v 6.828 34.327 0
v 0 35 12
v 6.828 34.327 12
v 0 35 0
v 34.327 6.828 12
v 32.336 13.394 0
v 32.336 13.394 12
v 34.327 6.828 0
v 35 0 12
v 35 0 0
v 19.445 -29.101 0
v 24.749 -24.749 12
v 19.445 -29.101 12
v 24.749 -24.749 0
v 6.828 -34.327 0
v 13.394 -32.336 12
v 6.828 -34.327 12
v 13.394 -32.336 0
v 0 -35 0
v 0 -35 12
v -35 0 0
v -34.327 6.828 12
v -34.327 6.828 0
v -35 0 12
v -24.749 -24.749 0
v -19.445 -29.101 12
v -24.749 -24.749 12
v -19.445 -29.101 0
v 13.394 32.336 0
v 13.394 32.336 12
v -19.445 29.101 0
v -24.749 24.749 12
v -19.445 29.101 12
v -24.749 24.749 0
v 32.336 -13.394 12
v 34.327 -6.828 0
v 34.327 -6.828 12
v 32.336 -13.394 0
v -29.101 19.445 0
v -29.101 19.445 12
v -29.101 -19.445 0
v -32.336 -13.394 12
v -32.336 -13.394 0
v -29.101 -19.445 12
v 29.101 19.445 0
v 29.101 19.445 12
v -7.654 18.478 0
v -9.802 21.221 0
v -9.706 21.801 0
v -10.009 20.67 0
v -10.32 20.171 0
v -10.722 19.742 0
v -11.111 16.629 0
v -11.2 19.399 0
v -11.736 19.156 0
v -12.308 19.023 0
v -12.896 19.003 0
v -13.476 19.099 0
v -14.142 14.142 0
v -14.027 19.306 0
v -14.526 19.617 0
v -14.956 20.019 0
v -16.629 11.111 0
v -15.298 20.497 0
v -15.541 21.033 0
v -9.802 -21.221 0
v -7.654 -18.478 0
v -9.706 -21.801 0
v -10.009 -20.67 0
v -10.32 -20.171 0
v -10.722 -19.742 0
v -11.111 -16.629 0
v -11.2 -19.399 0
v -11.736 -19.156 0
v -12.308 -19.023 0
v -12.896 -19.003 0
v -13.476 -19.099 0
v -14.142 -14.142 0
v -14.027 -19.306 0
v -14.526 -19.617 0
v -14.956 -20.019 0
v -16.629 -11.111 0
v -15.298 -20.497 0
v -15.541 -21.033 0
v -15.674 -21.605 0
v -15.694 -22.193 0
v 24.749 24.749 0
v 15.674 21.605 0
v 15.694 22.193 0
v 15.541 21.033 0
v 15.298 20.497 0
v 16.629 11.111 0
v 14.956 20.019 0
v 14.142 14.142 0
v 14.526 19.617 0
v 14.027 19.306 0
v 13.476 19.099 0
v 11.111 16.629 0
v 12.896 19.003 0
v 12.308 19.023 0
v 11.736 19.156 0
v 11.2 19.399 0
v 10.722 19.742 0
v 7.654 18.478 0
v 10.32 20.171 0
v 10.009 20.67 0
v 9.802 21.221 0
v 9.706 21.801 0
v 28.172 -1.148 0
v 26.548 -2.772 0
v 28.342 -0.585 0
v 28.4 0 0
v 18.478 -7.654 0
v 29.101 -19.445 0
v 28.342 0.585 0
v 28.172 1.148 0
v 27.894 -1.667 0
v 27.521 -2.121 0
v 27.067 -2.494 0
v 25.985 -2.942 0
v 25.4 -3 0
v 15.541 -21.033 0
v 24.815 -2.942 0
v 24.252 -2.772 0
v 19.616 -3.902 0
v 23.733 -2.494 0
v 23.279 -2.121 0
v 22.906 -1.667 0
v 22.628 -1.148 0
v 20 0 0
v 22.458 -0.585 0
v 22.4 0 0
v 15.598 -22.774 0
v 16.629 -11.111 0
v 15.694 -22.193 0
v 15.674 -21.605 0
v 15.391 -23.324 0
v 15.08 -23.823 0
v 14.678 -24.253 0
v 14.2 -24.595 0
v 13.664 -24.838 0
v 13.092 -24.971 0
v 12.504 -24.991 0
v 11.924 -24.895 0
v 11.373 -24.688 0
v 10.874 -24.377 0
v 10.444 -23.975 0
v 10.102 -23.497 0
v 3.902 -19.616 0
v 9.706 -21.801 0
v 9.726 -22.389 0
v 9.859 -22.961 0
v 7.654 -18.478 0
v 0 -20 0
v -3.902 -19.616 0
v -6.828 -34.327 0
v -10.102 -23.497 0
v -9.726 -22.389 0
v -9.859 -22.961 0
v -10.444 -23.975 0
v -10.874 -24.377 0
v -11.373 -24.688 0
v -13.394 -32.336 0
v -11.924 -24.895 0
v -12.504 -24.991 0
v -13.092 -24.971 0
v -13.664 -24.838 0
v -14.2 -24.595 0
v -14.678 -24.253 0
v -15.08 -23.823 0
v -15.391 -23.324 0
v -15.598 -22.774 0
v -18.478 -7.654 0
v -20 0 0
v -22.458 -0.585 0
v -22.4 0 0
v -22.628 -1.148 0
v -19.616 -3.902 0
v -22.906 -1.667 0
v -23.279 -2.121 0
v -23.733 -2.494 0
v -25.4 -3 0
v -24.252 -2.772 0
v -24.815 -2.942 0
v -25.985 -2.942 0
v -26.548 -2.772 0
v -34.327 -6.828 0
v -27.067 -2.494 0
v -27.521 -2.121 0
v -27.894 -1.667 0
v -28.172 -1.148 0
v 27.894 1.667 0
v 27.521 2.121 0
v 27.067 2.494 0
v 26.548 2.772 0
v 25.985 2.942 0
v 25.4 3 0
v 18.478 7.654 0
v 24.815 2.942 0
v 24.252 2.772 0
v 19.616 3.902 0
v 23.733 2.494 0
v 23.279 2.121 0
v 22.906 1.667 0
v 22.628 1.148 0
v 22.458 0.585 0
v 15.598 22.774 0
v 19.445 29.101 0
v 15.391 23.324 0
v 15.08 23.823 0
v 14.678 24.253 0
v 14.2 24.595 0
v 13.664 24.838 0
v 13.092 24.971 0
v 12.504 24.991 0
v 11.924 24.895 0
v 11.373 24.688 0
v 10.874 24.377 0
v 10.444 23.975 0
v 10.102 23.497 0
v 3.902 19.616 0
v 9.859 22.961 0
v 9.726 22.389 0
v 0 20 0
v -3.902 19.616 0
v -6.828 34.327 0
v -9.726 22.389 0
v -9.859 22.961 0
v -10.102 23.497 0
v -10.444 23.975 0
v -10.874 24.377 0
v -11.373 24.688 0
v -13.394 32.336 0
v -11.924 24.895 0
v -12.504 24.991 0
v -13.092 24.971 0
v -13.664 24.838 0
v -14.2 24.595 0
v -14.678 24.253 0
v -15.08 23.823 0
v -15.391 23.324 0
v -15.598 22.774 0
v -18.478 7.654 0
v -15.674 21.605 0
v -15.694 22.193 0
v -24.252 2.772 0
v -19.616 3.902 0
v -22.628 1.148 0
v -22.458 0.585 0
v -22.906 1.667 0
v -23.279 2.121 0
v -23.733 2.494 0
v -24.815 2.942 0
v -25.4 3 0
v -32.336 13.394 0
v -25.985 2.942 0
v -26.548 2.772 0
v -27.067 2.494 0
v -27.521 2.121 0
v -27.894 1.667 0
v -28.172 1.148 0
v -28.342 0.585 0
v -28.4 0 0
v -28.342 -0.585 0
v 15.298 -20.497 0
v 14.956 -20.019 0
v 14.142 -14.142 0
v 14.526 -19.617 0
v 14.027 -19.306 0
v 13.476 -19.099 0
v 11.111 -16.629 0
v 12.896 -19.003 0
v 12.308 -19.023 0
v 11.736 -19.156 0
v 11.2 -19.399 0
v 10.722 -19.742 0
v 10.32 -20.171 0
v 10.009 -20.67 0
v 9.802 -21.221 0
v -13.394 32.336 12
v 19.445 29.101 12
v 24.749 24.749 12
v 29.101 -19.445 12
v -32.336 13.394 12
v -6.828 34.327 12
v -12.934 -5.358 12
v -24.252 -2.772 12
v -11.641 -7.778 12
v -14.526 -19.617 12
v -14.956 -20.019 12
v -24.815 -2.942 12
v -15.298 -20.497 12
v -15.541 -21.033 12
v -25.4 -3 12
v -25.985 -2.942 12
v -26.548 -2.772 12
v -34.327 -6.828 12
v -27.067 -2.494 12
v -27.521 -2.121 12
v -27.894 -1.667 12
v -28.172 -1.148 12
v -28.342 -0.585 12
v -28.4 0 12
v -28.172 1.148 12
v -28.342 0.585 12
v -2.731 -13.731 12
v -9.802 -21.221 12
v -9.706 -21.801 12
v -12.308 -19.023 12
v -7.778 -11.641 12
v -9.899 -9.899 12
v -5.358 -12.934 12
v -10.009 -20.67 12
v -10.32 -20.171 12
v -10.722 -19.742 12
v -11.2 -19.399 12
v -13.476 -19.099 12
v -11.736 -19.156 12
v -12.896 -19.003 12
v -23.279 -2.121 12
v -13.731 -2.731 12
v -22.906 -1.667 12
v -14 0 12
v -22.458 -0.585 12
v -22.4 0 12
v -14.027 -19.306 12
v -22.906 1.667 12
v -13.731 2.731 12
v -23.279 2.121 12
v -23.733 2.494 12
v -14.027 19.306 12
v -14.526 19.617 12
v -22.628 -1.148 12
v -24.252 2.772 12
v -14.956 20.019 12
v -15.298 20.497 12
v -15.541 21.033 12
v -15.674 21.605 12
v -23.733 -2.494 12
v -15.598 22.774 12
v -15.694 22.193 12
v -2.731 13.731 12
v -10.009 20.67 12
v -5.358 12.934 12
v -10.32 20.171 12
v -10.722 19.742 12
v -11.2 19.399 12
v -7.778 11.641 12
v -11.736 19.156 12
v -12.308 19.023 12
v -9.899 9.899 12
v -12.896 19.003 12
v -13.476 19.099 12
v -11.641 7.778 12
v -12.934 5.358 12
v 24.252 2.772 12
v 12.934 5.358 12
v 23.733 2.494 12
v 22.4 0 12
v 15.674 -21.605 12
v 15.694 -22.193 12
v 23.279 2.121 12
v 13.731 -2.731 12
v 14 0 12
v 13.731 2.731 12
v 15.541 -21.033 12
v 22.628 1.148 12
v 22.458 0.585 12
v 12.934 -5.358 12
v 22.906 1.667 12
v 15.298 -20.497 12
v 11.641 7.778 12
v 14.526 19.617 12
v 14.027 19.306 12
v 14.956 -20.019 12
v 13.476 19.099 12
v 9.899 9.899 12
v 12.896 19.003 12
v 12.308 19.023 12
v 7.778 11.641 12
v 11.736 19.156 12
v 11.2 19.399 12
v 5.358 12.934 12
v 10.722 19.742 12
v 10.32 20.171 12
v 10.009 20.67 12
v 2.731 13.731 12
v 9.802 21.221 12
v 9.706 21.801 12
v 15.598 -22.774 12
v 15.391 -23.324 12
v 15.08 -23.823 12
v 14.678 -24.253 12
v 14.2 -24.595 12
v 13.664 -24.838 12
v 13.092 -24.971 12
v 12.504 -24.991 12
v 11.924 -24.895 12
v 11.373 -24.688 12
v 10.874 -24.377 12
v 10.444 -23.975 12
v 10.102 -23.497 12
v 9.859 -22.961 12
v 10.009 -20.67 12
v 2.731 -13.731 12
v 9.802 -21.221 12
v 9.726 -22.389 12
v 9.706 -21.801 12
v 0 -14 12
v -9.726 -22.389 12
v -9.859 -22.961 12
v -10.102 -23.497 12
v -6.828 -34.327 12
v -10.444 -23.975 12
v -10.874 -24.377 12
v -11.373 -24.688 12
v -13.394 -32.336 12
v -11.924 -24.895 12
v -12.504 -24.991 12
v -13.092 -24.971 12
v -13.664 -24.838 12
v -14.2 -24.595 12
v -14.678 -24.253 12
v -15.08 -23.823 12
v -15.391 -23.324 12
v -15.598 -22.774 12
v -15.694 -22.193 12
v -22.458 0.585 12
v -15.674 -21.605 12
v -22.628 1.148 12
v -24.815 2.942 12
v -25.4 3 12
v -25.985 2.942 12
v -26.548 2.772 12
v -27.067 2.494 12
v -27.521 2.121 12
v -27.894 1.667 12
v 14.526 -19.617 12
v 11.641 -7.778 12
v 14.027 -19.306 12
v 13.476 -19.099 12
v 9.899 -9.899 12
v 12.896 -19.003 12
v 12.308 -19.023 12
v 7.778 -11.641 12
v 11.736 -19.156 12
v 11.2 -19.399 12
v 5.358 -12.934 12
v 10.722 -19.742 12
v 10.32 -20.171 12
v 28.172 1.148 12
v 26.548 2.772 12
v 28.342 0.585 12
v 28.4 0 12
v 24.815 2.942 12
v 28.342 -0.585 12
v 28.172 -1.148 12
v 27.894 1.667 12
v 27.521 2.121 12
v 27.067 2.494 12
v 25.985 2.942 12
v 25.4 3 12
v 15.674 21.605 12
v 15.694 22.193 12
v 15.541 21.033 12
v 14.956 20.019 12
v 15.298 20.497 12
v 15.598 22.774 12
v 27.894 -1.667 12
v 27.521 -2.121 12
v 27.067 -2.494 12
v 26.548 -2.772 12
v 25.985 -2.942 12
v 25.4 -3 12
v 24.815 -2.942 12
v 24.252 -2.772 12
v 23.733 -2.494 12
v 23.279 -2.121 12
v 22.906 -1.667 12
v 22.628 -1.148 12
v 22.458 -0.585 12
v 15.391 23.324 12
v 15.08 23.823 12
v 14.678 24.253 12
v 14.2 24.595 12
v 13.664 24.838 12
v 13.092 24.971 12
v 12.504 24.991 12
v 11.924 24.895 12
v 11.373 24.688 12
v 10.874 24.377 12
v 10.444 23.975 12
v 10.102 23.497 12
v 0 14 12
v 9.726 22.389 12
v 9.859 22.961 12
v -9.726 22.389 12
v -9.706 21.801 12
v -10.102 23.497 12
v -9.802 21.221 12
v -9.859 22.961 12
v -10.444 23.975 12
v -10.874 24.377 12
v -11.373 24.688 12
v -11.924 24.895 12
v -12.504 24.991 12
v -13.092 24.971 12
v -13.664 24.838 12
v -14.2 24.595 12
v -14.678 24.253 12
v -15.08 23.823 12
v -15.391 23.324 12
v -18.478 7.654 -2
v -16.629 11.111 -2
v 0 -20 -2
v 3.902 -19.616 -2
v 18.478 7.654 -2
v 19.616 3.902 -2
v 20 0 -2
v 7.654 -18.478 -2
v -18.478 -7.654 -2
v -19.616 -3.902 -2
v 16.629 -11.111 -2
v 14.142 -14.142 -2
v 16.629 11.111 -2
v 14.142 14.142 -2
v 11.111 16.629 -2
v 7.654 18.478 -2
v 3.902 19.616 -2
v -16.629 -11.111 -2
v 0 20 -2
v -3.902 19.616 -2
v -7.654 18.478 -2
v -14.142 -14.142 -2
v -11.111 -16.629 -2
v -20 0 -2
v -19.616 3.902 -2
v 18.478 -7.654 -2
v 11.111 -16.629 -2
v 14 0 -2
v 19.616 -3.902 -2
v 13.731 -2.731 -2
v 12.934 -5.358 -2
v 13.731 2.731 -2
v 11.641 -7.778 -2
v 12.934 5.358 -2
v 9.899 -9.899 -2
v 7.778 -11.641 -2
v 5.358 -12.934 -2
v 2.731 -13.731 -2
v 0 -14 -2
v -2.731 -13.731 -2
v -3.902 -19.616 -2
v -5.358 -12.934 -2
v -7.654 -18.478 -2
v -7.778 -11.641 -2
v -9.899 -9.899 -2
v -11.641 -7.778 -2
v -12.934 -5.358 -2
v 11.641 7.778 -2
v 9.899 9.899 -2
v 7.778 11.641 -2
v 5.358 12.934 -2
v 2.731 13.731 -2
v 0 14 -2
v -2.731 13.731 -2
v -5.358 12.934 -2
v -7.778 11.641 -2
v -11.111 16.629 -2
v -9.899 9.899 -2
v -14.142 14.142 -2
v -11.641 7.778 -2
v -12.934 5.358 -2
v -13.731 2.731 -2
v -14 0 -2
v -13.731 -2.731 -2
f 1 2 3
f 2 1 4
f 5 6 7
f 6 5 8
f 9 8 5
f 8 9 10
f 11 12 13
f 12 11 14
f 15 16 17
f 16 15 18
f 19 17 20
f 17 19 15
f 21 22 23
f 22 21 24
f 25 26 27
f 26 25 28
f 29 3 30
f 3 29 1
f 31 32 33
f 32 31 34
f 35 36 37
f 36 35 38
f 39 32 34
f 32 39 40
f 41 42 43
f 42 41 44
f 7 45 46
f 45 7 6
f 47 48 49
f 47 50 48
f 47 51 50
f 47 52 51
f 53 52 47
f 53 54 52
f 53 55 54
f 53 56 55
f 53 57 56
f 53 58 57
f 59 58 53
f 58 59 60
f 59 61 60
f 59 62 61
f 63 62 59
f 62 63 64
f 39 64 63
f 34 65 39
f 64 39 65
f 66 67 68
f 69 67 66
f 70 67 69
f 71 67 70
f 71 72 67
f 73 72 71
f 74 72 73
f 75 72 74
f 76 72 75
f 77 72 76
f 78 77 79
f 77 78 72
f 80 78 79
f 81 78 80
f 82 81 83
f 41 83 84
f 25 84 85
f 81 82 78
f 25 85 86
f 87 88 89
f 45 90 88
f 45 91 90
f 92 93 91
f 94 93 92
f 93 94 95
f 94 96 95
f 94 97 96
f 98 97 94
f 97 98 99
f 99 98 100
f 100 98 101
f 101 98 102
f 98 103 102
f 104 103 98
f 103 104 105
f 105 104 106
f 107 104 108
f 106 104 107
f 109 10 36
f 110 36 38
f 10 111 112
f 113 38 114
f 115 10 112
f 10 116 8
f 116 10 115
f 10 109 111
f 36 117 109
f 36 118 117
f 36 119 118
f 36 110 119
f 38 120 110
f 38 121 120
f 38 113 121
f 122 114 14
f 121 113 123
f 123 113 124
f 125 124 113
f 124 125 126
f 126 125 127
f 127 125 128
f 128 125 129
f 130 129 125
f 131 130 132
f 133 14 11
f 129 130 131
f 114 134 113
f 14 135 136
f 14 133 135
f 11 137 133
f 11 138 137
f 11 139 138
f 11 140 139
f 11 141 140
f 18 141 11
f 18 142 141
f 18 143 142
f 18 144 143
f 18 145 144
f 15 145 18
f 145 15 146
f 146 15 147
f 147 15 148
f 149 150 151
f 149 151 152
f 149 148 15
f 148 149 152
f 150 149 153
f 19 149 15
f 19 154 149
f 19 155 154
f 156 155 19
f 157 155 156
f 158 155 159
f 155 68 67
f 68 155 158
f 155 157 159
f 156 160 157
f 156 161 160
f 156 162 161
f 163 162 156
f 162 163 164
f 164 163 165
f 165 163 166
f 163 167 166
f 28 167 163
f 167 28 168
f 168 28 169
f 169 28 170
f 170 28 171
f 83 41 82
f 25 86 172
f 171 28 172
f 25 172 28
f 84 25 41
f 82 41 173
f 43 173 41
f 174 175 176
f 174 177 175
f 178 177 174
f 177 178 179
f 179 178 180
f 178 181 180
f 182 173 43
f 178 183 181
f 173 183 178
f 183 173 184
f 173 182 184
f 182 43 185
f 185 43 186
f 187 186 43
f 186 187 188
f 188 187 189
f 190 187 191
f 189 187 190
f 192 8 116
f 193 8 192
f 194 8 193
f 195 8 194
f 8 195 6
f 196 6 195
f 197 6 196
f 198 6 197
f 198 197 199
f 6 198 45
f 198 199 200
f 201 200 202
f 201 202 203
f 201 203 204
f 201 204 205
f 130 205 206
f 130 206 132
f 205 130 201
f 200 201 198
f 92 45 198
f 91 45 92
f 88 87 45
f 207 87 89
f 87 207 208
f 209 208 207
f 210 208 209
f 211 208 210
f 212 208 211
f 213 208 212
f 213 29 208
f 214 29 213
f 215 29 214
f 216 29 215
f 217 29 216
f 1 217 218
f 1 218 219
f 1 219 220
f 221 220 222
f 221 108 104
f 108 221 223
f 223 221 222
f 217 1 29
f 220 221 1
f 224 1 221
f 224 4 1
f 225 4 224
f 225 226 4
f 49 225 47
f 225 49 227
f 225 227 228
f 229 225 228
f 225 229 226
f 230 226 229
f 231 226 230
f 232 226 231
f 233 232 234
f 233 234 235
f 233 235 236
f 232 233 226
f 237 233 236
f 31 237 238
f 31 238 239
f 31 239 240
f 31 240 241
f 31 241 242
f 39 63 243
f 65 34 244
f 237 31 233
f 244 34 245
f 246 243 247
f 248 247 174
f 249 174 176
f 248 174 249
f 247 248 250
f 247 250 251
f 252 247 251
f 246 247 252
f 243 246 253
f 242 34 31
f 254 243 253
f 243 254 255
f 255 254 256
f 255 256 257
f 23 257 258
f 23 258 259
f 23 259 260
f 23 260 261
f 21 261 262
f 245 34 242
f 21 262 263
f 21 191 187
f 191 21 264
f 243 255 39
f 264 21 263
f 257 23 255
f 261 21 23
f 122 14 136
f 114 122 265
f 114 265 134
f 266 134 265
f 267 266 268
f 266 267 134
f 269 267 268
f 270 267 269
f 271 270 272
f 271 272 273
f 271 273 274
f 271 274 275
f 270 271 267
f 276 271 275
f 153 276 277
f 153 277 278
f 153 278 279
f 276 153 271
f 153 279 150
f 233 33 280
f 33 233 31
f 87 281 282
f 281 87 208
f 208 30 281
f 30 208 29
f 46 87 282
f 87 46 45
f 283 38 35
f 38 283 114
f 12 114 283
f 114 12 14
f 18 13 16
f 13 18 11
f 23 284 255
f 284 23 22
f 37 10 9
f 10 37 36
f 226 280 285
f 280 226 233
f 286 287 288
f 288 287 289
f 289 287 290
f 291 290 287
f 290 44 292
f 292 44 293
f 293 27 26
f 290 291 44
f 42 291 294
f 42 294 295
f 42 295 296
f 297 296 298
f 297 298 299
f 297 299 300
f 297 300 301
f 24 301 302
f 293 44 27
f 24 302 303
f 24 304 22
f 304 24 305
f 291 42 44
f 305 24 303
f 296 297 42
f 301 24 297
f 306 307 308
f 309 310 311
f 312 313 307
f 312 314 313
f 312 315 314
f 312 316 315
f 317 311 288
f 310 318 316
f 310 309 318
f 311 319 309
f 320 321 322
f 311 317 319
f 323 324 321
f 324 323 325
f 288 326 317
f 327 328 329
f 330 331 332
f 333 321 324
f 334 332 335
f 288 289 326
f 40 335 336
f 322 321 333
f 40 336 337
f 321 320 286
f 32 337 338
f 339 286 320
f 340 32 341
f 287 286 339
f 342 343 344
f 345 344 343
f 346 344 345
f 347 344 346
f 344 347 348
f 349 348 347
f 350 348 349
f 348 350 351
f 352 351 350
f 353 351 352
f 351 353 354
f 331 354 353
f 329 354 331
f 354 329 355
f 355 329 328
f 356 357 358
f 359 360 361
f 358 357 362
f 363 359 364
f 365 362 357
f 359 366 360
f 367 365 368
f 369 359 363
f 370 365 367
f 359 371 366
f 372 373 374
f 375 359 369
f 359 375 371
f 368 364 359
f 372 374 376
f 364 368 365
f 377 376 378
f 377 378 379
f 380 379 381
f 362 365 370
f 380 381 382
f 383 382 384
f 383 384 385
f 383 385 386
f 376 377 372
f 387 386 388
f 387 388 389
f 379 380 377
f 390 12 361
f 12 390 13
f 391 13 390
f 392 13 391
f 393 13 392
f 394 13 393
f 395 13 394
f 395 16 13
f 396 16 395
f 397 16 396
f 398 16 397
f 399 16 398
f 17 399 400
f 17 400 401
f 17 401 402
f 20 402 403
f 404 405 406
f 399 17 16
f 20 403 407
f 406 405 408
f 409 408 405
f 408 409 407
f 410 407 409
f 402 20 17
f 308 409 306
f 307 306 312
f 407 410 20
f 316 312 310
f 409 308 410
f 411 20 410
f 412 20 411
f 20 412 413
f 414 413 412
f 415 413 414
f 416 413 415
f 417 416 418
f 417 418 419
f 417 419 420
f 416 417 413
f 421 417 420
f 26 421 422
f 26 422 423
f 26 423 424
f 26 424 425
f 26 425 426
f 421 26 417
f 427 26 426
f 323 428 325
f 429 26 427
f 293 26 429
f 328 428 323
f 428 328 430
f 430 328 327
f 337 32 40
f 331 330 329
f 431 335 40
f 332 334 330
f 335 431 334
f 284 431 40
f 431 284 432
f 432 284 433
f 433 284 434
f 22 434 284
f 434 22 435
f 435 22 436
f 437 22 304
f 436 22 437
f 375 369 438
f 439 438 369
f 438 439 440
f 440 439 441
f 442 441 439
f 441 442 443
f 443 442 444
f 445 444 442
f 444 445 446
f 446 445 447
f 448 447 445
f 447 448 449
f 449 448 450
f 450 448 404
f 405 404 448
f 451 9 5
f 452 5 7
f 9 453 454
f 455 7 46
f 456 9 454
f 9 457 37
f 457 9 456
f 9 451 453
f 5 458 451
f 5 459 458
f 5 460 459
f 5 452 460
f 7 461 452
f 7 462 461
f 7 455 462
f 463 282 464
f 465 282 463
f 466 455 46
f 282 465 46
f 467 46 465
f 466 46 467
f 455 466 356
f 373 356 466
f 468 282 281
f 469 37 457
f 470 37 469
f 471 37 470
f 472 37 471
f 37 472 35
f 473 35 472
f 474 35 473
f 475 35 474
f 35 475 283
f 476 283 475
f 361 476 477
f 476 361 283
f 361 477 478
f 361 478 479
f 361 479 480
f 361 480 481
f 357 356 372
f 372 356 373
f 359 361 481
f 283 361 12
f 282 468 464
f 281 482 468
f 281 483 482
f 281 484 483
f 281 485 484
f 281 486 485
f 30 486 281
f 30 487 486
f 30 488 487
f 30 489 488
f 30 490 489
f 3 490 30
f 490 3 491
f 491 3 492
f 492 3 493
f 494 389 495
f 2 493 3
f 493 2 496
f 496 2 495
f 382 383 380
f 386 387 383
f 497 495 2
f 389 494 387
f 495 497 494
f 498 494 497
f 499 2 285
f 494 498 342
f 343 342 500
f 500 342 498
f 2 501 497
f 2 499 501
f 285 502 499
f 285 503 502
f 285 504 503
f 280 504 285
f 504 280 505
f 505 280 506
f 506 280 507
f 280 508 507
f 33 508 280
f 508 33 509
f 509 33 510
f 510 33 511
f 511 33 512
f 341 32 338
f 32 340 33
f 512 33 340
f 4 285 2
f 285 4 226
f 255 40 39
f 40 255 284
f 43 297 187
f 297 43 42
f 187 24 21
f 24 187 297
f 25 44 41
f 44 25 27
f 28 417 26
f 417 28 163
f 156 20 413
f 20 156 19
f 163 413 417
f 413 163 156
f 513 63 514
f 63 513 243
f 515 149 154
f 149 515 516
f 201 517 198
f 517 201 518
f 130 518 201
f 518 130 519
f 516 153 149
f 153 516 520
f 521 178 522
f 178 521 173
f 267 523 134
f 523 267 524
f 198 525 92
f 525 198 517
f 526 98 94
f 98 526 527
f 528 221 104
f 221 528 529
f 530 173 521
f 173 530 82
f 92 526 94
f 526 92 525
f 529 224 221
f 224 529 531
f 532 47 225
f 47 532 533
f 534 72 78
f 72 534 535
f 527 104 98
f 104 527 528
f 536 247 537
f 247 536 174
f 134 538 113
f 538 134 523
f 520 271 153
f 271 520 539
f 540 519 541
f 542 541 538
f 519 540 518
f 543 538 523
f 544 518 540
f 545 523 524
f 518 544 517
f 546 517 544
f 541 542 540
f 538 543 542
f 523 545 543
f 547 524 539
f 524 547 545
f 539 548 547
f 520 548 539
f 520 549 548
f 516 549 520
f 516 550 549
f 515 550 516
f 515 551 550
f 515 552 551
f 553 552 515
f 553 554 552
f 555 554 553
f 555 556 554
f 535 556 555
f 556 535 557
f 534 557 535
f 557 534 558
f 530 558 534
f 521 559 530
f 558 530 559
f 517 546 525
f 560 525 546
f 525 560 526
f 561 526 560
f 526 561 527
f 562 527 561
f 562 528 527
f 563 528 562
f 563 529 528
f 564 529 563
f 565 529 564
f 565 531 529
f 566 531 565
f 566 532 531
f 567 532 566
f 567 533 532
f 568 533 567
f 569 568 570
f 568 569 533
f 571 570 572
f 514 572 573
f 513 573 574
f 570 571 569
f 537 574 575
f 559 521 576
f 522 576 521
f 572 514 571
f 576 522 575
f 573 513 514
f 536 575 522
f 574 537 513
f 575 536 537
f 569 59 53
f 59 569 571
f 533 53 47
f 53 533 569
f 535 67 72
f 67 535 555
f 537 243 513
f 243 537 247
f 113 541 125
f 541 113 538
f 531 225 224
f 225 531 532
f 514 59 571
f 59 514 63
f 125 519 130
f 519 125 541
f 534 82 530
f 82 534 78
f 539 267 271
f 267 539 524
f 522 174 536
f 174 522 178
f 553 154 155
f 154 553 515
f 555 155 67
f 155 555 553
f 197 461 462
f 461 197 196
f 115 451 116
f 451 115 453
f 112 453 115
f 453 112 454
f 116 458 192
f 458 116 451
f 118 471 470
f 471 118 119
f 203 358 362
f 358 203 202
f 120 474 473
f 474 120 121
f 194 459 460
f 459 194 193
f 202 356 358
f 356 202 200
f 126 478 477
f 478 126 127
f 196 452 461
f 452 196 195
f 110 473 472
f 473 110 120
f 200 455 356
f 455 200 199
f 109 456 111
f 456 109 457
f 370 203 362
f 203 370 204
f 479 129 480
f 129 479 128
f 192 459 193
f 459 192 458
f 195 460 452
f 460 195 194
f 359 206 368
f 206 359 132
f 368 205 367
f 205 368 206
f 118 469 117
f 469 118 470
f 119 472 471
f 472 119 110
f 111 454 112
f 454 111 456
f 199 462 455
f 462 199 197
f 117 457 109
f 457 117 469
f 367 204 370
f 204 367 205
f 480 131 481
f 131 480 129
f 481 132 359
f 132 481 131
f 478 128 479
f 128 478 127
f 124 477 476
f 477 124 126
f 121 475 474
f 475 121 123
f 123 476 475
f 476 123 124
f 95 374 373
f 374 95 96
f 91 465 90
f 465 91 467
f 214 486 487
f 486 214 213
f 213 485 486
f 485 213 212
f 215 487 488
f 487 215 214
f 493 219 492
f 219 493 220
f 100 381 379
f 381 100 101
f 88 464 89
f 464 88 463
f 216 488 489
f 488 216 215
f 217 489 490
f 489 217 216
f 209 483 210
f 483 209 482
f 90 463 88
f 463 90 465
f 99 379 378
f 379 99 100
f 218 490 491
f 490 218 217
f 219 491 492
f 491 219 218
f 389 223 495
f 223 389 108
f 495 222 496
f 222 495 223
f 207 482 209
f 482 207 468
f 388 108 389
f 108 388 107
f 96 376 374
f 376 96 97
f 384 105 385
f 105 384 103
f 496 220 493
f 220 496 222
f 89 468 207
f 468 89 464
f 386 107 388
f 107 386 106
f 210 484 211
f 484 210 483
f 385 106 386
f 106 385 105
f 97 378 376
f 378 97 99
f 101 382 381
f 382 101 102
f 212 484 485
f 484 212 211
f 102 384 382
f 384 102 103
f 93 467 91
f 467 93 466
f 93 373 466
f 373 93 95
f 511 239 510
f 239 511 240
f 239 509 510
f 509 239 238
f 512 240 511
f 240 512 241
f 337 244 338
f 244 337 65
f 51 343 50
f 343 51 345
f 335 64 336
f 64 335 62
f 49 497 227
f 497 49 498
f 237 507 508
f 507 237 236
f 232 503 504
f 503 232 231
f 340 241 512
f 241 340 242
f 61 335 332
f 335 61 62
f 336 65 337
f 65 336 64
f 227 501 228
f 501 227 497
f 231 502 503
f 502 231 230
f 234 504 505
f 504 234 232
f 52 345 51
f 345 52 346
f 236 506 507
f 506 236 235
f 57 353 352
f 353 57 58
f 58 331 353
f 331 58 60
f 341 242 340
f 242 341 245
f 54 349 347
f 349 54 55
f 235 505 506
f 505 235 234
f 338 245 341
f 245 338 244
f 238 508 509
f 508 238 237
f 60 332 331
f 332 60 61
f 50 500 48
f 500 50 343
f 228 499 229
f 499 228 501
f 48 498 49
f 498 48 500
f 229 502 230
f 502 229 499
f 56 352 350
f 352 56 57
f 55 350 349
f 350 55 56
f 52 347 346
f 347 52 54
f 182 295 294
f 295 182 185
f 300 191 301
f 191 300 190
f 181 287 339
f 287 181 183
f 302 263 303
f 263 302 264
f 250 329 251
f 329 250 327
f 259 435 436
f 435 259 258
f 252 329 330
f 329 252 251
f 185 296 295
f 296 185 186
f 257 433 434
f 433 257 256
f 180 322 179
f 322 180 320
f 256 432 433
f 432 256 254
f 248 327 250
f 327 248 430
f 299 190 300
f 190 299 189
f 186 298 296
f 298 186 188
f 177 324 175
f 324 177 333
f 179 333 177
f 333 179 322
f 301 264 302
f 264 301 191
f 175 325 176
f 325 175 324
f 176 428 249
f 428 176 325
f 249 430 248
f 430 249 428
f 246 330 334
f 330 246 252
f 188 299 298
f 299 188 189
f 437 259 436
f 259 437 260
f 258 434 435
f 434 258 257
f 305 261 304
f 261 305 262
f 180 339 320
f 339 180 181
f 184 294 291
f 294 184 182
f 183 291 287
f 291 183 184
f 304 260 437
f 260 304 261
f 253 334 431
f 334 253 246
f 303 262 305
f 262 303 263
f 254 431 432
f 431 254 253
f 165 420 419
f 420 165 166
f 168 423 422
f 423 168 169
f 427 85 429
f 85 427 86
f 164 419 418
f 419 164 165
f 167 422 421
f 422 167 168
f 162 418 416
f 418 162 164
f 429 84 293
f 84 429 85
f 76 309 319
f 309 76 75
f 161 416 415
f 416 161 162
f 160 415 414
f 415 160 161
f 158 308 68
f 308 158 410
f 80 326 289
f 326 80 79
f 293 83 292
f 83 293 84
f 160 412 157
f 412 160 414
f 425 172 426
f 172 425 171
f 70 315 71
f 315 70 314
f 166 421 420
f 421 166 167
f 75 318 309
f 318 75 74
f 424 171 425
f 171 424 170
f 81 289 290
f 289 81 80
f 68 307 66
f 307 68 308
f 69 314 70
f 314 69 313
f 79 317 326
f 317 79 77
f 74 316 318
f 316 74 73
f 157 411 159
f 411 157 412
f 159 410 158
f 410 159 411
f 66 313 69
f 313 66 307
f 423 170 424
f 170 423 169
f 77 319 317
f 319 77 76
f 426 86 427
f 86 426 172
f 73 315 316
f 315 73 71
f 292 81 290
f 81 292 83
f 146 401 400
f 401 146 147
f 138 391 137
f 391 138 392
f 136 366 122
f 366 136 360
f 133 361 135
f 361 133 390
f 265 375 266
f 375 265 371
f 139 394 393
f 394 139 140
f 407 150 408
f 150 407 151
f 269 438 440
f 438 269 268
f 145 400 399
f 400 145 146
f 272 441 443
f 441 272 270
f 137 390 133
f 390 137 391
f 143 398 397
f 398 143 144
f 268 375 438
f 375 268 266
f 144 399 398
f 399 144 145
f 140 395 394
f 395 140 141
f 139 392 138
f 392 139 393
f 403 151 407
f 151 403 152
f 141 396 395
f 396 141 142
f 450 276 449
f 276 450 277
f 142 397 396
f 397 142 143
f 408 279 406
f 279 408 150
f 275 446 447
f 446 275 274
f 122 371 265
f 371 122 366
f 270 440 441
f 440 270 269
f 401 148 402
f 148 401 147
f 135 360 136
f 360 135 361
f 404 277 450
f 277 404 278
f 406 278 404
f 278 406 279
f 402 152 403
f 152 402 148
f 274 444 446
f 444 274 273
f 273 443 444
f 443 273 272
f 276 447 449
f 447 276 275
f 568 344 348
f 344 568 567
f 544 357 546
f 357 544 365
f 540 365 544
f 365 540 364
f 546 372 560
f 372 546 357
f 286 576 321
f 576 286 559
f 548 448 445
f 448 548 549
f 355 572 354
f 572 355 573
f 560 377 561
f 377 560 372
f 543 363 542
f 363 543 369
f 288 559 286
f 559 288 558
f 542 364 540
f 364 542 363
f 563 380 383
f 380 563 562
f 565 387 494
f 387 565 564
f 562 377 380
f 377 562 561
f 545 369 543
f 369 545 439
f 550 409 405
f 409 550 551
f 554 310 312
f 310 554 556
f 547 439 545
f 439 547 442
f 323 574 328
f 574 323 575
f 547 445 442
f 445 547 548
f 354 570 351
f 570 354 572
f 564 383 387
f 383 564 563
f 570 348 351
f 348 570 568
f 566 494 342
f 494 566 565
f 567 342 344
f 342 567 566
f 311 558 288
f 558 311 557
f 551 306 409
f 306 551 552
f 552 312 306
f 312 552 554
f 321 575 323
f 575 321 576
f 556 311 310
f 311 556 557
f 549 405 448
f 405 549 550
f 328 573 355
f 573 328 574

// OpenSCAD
$fn = 32;

// ----------------------------------------------------------------------
// Bolt-circle flange: 70 mm outside, 6 bolt holes, bore 28 mm
// ----------------------------------------------------------------------

// --- parameters (mm) ---
flange_d = 70;            // flange outside diameter
flange_t = 12;            // flange thickness
bolts = 6;                // number of bolt holes
bolt_d = 6;               // bolt clearance
bolt_r = 25.4;            // bolt circle radius
bore_d = 28;              // centre bore
spigot_d = 40;            // spigot diameter
spigot_h = 3;             // spigot height below the flange
sink = 1;                 // overlap into the flange

module body() {
  cylinder(h = flange_t, d = flange_d);
  /* spigot on the back face, sunk into the flange */
  translate([0, 0, -spigot_h + sink]) cylinder(h = spigot_h, d = spigot_d);
}

difference() {
  body();
  /* bolt circle */
  for (i = [0 : bolts - 1]) rotate([0, 0, i * 360 / bolts]) translate([bolt_r, 0, -spigot_h - 1]) cylinder(h = flange_t + spigot_h + 3, d = bolt_d);
  translate([0, 0, -spigot_h - 1]) cylinder(h = flange_t + spigot_h + 3, d = bore_d);
}
